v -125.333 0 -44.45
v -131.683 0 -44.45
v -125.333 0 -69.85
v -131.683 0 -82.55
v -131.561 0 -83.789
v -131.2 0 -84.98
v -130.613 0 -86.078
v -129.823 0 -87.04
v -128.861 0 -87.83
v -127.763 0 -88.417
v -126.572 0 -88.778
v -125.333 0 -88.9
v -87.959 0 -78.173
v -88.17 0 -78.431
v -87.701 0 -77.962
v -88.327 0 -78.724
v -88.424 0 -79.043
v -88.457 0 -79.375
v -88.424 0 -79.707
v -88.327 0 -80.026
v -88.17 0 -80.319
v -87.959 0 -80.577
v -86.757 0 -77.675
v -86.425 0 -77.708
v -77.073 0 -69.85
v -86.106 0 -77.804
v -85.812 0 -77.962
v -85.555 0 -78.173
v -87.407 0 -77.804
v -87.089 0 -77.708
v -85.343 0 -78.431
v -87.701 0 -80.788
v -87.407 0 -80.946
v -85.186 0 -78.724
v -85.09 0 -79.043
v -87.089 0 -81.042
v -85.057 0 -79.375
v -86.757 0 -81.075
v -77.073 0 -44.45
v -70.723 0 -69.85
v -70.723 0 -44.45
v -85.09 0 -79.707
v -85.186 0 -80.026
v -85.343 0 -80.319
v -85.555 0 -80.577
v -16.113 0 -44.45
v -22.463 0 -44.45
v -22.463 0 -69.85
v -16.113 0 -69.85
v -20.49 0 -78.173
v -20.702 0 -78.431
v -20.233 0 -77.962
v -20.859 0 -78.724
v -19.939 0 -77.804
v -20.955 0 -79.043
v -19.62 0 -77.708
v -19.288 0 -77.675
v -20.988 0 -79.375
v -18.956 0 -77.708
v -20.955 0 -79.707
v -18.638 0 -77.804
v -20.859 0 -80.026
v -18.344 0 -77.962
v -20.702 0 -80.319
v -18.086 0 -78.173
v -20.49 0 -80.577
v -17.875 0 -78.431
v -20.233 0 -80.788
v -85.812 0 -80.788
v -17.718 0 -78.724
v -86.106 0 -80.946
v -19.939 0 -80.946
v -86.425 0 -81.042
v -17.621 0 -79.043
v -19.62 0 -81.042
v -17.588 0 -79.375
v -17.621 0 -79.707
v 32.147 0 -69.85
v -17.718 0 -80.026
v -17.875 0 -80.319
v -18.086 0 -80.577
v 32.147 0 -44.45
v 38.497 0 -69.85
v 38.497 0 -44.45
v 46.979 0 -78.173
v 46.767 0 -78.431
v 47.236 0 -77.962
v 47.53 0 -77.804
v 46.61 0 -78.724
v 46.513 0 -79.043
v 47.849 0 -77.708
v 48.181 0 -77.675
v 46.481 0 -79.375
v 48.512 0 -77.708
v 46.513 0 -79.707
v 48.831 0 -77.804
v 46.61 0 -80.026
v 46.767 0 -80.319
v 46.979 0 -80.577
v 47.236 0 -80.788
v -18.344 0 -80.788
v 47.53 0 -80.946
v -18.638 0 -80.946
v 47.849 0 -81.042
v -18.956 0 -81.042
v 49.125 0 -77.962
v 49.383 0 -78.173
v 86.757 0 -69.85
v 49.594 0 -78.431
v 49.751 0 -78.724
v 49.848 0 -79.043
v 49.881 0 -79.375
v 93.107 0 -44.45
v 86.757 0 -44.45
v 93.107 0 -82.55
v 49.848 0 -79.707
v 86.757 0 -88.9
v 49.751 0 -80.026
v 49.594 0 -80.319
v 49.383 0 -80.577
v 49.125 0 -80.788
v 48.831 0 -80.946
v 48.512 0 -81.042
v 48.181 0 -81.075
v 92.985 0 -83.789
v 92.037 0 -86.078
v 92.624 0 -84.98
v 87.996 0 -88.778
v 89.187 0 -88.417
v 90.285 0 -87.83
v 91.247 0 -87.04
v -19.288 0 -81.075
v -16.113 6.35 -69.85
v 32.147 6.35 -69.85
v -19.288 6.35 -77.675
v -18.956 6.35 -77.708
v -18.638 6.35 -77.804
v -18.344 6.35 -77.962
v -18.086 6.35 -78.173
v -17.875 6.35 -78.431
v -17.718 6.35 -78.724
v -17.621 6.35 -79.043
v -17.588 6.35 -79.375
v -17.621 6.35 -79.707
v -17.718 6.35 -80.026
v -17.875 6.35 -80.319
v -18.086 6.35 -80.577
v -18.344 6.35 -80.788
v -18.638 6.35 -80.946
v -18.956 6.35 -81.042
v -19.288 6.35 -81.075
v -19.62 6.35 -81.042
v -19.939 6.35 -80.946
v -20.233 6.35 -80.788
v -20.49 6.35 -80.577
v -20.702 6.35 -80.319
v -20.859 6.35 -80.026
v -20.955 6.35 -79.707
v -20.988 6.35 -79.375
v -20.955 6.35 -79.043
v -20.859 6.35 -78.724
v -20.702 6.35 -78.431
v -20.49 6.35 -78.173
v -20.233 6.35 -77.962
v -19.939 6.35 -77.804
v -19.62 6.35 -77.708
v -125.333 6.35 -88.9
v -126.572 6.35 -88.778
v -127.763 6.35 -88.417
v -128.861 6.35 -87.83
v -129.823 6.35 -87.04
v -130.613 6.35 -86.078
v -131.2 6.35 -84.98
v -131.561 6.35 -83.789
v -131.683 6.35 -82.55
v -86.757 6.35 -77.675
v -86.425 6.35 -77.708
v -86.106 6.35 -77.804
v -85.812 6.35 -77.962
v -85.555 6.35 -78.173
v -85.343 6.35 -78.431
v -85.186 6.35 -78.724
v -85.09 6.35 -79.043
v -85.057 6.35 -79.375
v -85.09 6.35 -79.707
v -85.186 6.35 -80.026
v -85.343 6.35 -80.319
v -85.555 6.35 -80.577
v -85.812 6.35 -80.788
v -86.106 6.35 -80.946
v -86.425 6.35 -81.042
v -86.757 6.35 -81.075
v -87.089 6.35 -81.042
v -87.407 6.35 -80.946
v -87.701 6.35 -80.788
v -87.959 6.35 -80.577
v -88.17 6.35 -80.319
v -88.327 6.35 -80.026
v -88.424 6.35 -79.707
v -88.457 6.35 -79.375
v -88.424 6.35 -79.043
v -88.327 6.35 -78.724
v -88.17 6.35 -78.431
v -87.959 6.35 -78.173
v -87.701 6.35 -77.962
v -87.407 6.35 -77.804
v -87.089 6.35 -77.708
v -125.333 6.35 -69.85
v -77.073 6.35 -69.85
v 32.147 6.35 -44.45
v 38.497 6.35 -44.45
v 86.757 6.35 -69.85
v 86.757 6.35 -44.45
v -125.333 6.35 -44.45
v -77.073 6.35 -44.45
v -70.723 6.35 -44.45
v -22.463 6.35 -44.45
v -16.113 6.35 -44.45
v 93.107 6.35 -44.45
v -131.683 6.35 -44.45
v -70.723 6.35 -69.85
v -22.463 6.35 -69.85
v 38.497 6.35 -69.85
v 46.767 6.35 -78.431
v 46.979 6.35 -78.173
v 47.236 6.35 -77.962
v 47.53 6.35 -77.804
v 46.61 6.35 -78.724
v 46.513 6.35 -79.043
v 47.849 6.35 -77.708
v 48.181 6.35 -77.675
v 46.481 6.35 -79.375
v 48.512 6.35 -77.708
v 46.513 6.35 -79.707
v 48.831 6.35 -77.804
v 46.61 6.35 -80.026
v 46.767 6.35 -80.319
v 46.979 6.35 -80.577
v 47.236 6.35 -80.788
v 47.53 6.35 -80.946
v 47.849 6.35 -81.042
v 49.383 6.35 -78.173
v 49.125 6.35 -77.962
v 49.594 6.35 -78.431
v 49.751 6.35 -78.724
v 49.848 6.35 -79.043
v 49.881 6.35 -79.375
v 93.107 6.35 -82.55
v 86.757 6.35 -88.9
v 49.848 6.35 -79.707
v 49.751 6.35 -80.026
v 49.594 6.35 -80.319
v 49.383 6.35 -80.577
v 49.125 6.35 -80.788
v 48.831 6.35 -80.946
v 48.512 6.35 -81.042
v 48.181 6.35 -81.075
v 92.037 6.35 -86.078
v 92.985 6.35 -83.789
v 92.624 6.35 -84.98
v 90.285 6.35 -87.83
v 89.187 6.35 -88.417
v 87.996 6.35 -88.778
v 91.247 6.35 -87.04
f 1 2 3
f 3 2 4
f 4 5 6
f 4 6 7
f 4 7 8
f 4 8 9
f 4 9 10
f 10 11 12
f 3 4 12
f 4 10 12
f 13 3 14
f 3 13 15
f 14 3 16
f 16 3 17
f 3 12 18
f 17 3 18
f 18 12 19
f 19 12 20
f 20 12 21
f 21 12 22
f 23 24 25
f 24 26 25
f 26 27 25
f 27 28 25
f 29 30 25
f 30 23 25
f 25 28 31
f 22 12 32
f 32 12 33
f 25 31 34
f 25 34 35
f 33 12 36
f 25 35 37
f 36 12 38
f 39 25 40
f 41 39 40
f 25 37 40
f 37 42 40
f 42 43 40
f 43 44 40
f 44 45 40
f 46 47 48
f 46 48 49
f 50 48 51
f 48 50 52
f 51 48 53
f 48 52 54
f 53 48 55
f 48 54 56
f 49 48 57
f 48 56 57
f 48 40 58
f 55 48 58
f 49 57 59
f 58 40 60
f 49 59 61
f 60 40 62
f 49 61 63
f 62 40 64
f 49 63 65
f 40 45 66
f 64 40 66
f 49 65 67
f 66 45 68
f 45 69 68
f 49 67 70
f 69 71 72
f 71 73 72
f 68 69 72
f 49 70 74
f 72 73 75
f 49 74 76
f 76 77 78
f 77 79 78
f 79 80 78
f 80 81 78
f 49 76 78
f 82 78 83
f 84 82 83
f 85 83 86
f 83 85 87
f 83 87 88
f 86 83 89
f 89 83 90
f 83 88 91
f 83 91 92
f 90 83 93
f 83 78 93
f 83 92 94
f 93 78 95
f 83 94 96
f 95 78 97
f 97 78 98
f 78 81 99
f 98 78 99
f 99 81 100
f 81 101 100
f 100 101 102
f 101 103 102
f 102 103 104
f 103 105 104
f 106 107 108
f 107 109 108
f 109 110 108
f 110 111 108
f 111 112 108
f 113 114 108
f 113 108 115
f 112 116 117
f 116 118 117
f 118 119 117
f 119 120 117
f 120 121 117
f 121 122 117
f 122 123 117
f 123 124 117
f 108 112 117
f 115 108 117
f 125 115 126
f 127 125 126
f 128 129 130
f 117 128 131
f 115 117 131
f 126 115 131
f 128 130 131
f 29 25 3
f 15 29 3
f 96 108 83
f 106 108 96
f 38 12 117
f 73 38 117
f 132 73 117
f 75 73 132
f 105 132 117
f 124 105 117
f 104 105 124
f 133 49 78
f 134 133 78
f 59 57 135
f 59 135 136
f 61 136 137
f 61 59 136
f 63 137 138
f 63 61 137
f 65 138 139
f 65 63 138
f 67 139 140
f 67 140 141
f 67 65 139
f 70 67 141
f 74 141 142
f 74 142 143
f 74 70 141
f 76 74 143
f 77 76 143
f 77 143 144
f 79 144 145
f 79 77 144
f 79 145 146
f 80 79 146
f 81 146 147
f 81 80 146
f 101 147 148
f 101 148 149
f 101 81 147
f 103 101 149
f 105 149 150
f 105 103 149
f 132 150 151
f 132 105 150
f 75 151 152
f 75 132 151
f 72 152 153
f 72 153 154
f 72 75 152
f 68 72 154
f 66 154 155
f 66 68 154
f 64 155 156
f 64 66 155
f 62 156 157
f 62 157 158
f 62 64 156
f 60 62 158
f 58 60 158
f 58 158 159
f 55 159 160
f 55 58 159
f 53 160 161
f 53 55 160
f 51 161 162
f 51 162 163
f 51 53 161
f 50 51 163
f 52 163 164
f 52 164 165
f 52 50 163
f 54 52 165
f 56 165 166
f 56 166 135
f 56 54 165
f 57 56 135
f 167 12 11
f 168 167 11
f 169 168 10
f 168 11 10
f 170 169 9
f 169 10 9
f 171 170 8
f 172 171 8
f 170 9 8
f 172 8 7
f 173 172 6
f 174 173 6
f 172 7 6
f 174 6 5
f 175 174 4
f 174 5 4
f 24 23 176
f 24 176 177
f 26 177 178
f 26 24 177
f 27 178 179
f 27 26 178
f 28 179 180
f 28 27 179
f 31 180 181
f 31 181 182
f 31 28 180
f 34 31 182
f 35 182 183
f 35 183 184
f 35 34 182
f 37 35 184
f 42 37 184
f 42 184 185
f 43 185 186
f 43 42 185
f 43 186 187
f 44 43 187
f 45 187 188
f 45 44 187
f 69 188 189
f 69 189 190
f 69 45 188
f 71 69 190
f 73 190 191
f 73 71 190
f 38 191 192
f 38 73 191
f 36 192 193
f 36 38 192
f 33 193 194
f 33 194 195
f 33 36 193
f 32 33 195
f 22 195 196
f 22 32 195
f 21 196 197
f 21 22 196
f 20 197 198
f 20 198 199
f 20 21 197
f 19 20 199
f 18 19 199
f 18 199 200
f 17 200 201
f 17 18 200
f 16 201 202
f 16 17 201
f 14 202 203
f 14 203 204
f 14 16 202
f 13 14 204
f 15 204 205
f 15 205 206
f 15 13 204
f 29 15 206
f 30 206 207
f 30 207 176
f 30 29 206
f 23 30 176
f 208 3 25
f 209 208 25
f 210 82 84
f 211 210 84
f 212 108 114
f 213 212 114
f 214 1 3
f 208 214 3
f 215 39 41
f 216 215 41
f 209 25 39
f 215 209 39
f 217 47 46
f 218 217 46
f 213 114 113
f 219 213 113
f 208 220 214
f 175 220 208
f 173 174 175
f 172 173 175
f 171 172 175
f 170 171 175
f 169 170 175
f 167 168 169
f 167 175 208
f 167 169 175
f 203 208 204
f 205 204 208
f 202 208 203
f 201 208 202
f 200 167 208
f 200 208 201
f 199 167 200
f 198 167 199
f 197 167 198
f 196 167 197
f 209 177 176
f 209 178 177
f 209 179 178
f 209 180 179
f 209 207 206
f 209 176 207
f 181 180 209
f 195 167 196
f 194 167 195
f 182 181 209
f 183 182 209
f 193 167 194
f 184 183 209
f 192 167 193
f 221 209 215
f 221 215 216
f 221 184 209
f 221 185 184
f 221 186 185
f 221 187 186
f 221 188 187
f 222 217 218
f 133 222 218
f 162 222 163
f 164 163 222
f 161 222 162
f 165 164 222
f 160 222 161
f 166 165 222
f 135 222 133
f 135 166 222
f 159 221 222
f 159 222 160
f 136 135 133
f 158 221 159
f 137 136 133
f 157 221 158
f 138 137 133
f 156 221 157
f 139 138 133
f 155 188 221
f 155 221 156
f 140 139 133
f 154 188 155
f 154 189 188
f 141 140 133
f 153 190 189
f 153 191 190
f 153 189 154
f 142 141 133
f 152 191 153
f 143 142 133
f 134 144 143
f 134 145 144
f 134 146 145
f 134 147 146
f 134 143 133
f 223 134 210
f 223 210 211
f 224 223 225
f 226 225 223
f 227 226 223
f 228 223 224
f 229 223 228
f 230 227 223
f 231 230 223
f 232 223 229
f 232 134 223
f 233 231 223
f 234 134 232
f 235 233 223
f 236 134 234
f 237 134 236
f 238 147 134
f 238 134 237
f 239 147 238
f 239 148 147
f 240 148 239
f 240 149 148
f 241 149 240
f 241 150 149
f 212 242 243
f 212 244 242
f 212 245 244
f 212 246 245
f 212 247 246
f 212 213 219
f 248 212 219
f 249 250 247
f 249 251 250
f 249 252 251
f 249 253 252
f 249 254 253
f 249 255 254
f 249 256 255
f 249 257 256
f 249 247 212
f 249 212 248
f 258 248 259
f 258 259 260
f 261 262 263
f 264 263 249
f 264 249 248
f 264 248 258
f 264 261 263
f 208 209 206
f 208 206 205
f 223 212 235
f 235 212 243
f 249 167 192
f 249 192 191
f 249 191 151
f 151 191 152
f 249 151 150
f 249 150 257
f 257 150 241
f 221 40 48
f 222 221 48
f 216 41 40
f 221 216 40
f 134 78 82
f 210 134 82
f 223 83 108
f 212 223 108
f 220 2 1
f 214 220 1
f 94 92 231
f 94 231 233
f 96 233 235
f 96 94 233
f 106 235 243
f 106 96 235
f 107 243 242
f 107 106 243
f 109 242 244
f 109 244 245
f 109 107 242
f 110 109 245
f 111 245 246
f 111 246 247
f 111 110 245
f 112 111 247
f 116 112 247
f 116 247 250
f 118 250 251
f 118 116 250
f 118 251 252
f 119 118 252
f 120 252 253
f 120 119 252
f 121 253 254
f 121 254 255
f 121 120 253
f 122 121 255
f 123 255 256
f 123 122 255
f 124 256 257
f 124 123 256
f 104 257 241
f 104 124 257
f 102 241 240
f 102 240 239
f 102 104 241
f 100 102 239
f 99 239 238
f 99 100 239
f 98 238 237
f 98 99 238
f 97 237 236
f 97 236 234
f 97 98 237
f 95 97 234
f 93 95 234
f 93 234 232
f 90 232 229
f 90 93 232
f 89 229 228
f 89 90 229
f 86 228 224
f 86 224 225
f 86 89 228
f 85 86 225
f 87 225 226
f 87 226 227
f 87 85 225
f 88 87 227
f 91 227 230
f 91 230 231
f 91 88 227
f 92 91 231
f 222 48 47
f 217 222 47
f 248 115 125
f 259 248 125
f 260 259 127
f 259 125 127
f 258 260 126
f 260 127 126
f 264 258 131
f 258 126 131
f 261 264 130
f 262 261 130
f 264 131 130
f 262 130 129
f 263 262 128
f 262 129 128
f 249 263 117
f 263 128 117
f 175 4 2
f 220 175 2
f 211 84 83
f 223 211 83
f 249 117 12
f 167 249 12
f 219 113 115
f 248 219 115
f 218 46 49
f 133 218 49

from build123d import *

# Parameters (mm, degrees)
SKETCH1_R           = 1.7
BOSS_EXTRUDE1_DEPTH = 6.35


with BuildPart() as part:
    # Sketch1 → Boss-Extrude1 (new body)
    with BuildSketch(Plane(origin=(0, 0, 0), x_dir=(1, 0, 0), z_dir=(0, 1, 0))):
        with BuildLine():
            Line((-131.683125, 82.55), (-131.683125, 44.45))
            Line((-131.683125, 44.45), (-125.333125, 44.45))
            Line((-125.333125, 44.45), (-125.333125, 69.85))
            Line((-125.333125, 69.85), (-77.073125, 69.85))
            Line((-77.073125, 69.85), (-77.073125, 44.45))
            Line((-77.073125, 44.45), (-70.723125, 44.45))
            Line((-70.723125, 44.45), (-70.723125, 69.85))
            Line((-70.723125, 69.85), (-22.463125, 69.85))
            Line((-22.463125, 69.85), (-22.463125, 44.45))
            Line((-22.463125, 44.45), (-16.113125, 44.45))
            Line((-16.113125, 44.45), (-16.113125, 69.85))
            Line((-16.113125, 69.85), (32.146875, 69.85))
            Line((32.146875, 69.85), (32.146875, 44.45))
            Line((32.146875, 44.45), (38.496875, 44.45))
            Line((38.496875, 44.45), (38.496875, 69.85))
            Line((38.496875, 69.85), (86.756875, 69.85))
            Line((86.756875, 69.85), (86.756875, 44.45))
            Line((86.756875, 44.45), (93.106875, 44.45))
            Line((93.106875, 44.45), (93.106875, 82.55))
            ThreePointArc((93.106875, 82.55), (91.247003061, 87.040128061), (86.756875, 88.9))
            Line((86.756875, 88.9), (-125.333125, 88.9))
            ThreePointArc((-125.333125, 88.9), (-129.823253061, 87.040128061), (-131.683125, 82.55))
        make_face()
        with Locations(Location((-86.756875, 79.375, 0), (0, 0, 270))):
            Circle(SKETCH1_R, mode=Mode.SUBTRACT)
        with Locations(Location((-19.288125, 79.375, 0), (0, 0, 270))):
            Circle(SKETCH1_R, mode=Mode.SUBTRACT)
        with Locations(Location((48.180625, 79.375, 0), (0, 0, 270))):
            Circle(SKETCH1_R, mode=Mode.SUBTRACT)
    extrude(amount=BOSS_EXTRUDE1_DEPTH)


solid = part.part
